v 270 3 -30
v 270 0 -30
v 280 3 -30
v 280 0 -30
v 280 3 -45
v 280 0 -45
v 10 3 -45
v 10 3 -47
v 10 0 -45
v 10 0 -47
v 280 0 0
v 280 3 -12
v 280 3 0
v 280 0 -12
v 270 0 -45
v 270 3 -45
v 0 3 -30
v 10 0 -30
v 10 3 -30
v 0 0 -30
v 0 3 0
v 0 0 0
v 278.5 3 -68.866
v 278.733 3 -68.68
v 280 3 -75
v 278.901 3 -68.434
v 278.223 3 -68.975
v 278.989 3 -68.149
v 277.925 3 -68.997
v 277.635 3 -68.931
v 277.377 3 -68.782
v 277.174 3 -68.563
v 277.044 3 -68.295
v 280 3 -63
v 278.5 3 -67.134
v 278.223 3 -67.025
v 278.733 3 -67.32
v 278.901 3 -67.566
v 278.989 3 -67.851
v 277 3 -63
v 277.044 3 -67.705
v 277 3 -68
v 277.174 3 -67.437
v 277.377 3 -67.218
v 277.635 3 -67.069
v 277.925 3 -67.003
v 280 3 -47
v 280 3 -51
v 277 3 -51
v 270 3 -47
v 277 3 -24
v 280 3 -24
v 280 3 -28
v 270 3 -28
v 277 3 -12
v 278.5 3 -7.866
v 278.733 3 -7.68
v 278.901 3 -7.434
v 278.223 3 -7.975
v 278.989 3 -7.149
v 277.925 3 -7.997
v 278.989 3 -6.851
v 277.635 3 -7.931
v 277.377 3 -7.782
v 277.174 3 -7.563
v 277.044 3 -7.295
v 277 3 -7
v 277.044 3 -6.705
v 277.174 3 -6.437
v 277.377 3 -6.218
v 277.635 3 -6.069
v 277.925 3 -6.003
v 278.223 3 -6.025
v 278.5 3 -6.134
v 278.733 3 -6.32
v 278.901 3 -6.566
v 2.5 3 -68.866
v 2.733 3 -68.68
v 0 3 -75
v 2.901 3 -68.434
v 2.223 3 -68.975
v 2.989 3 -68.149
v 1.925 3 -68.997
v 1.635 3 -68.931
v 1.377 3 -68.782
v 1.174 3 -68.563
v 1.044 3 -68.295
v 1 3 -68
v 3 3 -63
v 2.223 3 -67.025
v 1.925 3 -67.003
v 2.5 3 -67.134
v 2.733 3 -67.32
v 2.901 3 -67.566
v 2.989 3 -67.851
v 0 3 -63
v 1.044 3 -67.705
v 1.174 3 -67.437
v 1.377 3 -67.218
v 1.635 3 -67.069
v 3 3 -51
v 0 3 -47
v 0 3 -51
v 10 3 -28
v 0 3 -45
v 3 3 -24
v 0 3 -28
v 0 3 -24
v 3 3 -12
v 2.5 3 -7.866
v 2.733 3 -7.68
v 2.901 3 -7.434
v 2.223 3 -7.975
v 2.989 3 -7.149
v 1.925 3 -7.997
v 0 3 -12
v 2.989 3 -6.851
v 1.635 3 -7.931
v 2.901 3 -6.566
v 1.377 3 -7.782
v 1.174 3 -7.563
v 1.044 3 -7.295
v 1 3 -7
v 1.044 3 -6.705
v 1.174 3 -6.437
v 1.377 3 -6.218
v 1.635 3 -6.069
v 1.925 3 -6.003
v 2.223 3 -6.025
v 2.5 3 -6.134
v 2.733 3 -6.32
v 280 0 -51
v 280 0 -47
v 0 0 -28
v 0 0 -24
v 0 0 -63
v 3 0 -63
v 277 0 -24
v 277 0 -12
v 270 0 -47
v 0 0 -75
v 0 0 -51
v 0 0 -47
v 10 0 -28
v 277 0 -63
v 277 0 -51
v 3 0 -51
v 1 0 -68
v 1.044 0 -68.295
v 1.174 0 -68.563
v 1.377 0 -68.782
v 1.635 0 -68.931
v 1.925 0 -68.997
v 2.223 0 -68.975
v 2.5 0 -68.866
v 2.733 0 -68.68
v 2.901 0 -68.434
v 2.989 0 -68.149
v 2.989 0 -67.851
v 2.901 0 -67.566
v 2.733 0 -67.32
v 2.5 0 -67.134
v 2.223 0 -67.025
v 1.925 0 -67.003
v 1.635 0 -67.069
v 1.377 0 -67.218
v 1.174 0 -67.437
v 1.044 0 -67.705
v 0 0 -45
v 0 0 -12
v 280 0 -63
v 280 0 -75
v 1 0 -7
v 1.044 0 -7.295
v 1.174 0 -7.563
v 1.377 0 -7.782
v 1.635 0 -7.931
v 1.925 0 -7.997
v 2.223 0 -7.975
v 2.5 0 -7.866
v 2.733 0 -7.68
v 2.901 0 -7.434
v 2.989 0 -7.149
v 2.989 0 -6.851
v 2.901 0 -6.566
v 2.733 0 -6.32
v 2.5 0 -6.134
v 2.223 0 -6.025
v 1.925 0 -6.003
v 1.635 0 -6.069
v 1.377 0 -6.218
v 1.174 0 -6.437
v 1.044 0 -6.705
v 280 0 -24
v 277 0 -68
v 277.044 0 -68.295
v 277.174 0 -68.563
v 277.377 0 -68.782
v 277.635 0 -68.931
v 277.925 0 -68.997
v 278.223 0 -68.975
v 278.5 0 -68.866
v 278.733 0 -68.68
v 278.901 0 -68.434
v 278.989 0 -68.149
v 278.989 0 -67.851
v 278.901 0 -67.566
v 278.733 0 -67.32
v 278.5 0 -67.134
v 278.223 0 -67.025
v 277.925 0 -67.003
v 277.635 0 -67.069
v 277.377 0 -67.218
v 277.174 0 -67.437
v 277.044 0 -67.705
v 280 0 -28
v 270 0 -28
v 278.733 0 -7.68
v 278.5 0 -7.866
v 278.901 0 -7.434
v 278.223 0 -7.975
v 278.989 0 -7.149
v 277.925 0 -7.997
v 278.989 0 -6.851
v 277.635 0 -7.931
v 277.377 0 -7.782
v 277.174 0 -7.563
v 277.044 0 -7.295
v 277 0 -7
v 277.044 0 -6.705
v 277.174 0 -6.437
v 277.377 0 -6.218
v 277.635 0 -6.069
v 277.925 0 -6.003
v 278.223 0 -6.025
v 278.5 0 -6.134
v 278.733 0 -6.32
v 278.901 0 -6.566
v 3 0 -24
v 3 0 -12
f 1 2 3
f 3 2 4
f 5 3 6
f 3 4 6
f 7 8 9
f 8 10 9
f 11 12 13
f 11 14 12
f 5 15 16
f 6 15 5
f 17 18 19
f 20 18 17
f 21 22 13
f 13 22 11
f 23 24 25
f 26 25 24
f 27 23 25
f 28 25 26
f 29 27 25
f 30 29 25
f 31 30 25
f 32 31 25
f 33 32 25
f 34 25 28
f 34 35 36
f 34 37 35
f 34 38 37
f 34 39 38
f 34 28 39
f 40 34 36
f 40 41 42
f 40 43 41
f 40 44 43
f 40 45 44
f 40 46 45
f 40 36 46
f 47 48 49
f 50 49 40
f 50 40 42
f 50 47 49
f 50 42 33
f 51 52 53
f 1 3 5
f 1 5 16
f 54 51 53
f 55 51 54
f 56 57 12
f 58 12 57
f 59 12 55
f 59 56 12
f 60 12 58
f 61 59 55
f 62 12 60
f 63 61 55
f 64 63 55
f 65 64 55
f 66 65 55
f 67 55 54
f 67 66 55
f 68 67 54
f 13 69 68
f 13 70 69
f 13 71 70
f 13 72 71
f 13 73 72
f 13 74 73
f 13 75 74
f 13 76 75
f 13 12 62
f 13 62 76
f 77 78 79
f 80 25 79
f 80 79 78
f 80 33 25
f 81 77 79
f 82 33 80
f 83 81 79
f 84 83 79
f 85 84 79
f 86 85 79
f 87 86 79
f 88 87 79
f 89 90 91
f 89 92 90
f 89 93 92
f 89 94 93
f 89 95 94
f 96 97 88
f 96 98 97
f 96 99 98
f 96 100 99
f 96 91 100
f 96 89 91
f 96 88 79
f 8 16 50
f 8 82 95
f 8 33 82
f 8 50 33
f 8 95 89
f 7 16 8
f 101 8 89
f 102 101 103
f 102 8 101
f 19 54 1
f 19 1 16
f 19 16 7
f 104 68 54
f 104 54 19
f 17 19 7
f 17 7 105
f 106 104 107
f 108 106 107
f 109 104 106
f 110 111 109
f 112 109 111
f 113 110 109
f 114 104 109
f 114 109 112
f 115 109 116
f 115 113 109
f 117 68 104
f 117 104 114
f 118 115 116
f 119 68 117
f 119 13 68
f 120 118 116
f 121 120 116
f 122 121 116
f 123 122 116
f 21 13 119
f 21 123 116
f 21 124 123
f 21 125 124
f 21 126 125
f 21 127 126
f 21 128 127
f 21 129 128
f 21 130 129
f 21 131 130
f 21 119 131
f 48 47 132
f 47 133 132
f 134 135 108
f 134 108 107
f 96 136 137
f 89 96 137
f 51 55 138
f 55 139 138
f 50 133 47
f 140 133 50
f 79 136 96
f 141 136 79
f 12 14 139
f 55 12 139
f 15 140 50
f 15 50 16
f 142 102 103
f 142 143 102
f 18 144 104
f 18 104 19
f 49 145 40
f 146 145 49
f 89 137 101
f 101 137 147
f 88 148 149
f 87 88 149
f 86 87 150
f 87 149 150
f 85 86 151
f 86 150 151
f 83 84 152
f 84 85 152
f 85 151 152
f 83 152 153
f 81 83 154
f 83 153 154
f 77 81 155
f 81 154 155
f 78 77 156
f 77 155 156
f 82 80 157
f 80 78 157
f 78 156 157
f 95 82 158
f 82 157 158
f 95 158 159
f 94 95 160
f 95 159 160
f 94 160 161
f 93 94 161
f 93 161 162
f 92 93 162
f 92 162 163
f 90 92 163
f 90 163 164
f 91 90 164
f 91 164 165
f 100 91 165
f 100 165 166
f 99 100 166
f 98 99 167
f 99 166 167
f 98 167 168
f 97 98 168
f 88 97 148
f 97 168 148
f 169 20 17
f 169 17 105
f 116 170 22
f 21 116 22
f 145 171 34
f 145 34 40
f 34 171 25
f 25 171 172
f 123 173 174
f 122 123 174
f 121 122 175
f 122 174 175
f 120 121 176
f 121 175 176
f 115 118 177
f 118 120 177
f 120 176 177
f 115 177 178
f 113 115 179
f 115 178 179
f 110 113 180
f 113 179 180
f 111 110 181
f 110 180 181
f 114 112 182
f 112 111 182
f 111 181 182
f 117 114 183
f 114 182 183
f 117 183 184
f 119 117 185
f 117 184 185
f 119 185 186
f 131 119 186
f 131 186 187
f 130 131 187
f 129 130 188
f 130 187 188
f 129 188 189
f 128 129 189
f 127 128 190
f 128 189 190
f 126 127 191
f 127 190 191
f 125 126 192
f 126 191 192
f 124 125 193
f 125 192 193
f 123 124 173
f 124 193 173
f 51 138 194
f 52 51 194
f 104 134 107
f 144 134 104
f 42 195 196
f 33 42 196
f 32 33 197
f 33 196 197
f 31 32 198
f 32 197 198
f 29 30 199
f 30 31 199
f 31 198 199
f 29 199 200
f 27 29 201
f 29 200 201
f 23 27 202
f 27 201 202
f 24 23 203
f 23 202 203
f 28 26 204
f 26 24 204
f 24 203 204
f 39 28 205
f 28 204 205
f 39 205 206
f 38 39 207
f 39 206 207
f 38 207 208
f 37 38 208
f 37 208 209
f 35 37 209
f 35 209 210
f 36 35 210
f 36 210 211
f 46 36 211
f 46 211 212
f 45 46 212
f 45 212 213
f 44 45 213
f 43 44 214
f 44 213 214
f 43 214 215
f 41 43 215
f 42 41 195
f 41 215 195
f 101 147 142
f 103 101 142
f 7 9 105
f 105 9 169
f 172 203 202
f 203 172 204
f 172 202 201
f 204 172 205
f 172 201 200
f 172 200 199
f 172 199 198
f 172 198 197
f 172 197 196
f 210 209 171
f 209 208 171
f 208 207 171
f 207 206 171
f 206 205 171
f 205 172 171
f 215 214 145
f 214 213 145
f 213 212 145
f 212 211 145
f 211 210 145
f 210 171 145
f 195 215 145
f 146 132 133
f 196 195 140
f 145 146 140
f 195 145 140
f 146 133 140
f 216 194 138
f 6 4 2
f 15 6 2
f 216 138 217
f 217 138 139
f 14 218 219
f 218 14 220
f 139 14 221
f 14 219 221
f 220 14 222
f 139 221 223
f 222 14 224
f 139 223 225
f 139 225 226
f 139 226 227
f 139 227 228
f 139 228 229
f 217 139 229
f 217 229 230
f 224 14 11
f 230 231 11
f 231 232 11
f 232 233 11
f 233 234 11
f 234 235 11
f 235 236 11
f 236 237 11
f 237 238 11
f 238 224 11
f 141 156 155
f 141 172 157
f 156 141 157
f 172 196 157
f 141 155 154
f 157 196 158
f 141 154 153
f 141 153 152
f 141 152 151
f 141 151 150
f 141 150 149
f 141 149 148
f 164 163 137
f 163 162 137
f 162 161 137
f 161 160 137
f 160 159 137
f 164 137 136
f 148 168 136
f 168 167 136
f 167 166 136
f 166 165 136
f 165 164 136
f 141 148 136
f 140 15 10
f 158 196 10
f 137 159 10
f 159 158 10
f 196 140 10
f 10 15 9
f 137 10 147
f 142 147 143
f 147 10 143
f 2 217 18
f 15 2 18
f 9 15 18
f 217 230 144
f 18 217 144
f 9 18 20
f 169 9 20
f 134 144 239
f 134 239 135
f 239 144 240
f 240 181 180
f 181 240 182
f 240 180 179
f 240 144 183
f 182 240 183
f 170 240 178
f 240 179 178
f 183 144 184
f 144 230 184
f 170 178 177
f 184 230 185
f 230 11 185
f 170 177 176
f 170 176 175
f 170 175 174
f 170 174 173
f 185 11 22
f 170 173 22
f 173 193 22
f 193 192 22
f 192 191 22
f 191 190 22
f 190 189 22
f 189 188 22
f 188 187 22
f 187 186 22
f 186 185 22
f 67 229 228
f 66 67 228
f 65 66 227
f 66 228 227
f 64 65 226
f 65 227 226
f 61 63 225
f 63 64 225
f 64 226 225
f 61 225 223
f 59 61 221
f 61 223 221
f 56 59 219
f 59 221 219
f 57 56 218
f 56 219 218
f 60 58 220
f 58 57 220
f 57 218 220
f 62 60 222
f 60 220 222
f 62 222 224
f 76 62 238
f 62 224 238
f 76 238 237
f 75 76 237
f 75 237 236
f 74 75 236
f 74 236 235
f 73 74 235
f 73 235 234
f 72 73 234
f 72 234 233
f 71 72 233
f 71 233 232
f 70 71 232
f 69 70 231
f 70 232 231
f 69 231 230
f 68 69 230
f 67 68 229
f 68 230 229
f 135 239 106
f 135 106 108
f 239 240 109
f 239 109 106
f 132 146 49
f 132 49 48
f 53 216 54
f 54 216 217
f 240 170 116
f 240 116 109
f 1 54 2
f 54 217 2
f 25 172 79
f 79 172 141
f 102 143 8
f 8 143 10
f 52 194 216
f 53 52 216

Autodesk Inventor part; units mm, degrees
ref_plane "YZ Plane" through (0, 0, 0) normal (1, 0, 0) x (0, 1, 0)
ref_plane "XZ Plane" through (0, 0, 0) normal (0, 1, 0) x (-1, 0, 0)
ref_plane "XY Plane" through (0, 0, 0) normal (0, 0, 1) x (1, 0, 0)
sketch "Sketch1" plane through (0, 0, 0) normal (0, 1, 0) x (-1, 0, 0)
  line L0 (0, 0) -> (-280, 0)
  line L1 (-280, -75) -> (0, -75)
  line L2 (-280, -63) -> (-277, -63)
  line L3 (-277, -63) -> (-277, -51)
  line L4 (-277, -51) -> (-280, -51)
  line L5 (-280, -51) -> (-280, -63) construction
  line L6 (-280, -12) -> (-277, -12)
  line L7 (-277, -12) -> (-277, -24)
  line L8 (-277, -24) -> (-280, -24)
  line L9 (-280, -24) -> (-280, -12) construction
  line L10 (-140, 0) -> (-140, -75) construction
  line L11 (-280, -12) -> (-280, 0)
  line L12 (-280, -24) -> (-280, -28)
  line L13 (-280, -63) -> (-280, -75)
  circle A0 centre (-278, -7) radius 1
  line L14 (-278, -7) -> (-278, -12) construction
  line L15 (-278, -7) -> (-278, 0) construction
  circle A1 centre (-278, -68) radius 1
  line L16 (-280, -47) -> (-270, -47)
  line L17 (-270, -47) -> (-270, -45)
  line L18 (-270, -45) -> (-280, -45)
  line L19 (-280, -28) -> (-270, -28)
  line L20 (-270, -28) -> (-270, -30)
  line L21 (-270, -30) -> (-280, -30)
  line L22 (-280, -47) -> (-280, -51)
  line L23 (-280, -45) -> (-280, -47) construction
  line L24 (-280, -30) -> (-280, -45)
  line L25 (-280, -28) -> (-280, -30) construction
  line L26 (0, -63) -> (-3, -63)
  line L27 (-3, -63) -> (-3, -51)
  line L28 (-3, -51) -> (0, -51)
  line L29 (0, -51) -> (0, -63) construction
  line L30 (0, -12) -> (-3, -12)
  line L31 (-3, -12) -> (-3, -24)
  line L32 (-3, -24) -> (0, -24)
  line L33 (0, -24) -> (0, -12) construction
  line L34 (0, -12) -> (0, 0)
  line L35 (0, -24) -> (0, -28)
  line L36 (0, -63) -> (0, -75)
  circle A2 centre (-2, -7) radius 1
  line L37 (-2, -7) -> (-2, -12) construction
  line L38 (-2, -7) -> (-2, 0) construction
  circle A3 centre (-2, -68) radius 1
  line L39 (0, -47) -> (-10, -47)
  line L40 (-10, -47) -> (-10, -45)
  line L41 (-10, -45) -> (0, -45)
  line L42 (0, -28) -> (-10, -28)
  line L43 (-10, -28) -> (-10, -30)
  line L44 (-10, -30) -> (0, -30)
  line L45 (0, -47) -> (0, -51)
  line L46 (0, -45) -> (0, -47) construction
  line L47 (0, -30) -> (0, -45)
  line L48 (0, -28) -> (0, -30) construction
  dimension "d0" = 280
  dimension "d1" = 75
  dimension "d20" = 3
  dimension "d21" = 12
  dimension "d22" = 12
  dimension "d26" = 27
  dimension "d27" = 2
  dimension "d28" = 2
  dimension "d29" = 5
  dimension "d30" = 2
  dimension "d31" = 2
  dimension "d32" = 5
  dimension "d33" = 10
  dimension "d34" = 2
  dimension "d35" = 10
  dimension "d36" = 2
  dimension "d37" = 4
extrude "Extrusion2" add sketch "Sketch1" along normal blind 3
equation "\"d22\" = d21"
equation "\"d33\" = d35"
equation "\"d34\" = d36"
properties part number "wall-front-scaled-model"
